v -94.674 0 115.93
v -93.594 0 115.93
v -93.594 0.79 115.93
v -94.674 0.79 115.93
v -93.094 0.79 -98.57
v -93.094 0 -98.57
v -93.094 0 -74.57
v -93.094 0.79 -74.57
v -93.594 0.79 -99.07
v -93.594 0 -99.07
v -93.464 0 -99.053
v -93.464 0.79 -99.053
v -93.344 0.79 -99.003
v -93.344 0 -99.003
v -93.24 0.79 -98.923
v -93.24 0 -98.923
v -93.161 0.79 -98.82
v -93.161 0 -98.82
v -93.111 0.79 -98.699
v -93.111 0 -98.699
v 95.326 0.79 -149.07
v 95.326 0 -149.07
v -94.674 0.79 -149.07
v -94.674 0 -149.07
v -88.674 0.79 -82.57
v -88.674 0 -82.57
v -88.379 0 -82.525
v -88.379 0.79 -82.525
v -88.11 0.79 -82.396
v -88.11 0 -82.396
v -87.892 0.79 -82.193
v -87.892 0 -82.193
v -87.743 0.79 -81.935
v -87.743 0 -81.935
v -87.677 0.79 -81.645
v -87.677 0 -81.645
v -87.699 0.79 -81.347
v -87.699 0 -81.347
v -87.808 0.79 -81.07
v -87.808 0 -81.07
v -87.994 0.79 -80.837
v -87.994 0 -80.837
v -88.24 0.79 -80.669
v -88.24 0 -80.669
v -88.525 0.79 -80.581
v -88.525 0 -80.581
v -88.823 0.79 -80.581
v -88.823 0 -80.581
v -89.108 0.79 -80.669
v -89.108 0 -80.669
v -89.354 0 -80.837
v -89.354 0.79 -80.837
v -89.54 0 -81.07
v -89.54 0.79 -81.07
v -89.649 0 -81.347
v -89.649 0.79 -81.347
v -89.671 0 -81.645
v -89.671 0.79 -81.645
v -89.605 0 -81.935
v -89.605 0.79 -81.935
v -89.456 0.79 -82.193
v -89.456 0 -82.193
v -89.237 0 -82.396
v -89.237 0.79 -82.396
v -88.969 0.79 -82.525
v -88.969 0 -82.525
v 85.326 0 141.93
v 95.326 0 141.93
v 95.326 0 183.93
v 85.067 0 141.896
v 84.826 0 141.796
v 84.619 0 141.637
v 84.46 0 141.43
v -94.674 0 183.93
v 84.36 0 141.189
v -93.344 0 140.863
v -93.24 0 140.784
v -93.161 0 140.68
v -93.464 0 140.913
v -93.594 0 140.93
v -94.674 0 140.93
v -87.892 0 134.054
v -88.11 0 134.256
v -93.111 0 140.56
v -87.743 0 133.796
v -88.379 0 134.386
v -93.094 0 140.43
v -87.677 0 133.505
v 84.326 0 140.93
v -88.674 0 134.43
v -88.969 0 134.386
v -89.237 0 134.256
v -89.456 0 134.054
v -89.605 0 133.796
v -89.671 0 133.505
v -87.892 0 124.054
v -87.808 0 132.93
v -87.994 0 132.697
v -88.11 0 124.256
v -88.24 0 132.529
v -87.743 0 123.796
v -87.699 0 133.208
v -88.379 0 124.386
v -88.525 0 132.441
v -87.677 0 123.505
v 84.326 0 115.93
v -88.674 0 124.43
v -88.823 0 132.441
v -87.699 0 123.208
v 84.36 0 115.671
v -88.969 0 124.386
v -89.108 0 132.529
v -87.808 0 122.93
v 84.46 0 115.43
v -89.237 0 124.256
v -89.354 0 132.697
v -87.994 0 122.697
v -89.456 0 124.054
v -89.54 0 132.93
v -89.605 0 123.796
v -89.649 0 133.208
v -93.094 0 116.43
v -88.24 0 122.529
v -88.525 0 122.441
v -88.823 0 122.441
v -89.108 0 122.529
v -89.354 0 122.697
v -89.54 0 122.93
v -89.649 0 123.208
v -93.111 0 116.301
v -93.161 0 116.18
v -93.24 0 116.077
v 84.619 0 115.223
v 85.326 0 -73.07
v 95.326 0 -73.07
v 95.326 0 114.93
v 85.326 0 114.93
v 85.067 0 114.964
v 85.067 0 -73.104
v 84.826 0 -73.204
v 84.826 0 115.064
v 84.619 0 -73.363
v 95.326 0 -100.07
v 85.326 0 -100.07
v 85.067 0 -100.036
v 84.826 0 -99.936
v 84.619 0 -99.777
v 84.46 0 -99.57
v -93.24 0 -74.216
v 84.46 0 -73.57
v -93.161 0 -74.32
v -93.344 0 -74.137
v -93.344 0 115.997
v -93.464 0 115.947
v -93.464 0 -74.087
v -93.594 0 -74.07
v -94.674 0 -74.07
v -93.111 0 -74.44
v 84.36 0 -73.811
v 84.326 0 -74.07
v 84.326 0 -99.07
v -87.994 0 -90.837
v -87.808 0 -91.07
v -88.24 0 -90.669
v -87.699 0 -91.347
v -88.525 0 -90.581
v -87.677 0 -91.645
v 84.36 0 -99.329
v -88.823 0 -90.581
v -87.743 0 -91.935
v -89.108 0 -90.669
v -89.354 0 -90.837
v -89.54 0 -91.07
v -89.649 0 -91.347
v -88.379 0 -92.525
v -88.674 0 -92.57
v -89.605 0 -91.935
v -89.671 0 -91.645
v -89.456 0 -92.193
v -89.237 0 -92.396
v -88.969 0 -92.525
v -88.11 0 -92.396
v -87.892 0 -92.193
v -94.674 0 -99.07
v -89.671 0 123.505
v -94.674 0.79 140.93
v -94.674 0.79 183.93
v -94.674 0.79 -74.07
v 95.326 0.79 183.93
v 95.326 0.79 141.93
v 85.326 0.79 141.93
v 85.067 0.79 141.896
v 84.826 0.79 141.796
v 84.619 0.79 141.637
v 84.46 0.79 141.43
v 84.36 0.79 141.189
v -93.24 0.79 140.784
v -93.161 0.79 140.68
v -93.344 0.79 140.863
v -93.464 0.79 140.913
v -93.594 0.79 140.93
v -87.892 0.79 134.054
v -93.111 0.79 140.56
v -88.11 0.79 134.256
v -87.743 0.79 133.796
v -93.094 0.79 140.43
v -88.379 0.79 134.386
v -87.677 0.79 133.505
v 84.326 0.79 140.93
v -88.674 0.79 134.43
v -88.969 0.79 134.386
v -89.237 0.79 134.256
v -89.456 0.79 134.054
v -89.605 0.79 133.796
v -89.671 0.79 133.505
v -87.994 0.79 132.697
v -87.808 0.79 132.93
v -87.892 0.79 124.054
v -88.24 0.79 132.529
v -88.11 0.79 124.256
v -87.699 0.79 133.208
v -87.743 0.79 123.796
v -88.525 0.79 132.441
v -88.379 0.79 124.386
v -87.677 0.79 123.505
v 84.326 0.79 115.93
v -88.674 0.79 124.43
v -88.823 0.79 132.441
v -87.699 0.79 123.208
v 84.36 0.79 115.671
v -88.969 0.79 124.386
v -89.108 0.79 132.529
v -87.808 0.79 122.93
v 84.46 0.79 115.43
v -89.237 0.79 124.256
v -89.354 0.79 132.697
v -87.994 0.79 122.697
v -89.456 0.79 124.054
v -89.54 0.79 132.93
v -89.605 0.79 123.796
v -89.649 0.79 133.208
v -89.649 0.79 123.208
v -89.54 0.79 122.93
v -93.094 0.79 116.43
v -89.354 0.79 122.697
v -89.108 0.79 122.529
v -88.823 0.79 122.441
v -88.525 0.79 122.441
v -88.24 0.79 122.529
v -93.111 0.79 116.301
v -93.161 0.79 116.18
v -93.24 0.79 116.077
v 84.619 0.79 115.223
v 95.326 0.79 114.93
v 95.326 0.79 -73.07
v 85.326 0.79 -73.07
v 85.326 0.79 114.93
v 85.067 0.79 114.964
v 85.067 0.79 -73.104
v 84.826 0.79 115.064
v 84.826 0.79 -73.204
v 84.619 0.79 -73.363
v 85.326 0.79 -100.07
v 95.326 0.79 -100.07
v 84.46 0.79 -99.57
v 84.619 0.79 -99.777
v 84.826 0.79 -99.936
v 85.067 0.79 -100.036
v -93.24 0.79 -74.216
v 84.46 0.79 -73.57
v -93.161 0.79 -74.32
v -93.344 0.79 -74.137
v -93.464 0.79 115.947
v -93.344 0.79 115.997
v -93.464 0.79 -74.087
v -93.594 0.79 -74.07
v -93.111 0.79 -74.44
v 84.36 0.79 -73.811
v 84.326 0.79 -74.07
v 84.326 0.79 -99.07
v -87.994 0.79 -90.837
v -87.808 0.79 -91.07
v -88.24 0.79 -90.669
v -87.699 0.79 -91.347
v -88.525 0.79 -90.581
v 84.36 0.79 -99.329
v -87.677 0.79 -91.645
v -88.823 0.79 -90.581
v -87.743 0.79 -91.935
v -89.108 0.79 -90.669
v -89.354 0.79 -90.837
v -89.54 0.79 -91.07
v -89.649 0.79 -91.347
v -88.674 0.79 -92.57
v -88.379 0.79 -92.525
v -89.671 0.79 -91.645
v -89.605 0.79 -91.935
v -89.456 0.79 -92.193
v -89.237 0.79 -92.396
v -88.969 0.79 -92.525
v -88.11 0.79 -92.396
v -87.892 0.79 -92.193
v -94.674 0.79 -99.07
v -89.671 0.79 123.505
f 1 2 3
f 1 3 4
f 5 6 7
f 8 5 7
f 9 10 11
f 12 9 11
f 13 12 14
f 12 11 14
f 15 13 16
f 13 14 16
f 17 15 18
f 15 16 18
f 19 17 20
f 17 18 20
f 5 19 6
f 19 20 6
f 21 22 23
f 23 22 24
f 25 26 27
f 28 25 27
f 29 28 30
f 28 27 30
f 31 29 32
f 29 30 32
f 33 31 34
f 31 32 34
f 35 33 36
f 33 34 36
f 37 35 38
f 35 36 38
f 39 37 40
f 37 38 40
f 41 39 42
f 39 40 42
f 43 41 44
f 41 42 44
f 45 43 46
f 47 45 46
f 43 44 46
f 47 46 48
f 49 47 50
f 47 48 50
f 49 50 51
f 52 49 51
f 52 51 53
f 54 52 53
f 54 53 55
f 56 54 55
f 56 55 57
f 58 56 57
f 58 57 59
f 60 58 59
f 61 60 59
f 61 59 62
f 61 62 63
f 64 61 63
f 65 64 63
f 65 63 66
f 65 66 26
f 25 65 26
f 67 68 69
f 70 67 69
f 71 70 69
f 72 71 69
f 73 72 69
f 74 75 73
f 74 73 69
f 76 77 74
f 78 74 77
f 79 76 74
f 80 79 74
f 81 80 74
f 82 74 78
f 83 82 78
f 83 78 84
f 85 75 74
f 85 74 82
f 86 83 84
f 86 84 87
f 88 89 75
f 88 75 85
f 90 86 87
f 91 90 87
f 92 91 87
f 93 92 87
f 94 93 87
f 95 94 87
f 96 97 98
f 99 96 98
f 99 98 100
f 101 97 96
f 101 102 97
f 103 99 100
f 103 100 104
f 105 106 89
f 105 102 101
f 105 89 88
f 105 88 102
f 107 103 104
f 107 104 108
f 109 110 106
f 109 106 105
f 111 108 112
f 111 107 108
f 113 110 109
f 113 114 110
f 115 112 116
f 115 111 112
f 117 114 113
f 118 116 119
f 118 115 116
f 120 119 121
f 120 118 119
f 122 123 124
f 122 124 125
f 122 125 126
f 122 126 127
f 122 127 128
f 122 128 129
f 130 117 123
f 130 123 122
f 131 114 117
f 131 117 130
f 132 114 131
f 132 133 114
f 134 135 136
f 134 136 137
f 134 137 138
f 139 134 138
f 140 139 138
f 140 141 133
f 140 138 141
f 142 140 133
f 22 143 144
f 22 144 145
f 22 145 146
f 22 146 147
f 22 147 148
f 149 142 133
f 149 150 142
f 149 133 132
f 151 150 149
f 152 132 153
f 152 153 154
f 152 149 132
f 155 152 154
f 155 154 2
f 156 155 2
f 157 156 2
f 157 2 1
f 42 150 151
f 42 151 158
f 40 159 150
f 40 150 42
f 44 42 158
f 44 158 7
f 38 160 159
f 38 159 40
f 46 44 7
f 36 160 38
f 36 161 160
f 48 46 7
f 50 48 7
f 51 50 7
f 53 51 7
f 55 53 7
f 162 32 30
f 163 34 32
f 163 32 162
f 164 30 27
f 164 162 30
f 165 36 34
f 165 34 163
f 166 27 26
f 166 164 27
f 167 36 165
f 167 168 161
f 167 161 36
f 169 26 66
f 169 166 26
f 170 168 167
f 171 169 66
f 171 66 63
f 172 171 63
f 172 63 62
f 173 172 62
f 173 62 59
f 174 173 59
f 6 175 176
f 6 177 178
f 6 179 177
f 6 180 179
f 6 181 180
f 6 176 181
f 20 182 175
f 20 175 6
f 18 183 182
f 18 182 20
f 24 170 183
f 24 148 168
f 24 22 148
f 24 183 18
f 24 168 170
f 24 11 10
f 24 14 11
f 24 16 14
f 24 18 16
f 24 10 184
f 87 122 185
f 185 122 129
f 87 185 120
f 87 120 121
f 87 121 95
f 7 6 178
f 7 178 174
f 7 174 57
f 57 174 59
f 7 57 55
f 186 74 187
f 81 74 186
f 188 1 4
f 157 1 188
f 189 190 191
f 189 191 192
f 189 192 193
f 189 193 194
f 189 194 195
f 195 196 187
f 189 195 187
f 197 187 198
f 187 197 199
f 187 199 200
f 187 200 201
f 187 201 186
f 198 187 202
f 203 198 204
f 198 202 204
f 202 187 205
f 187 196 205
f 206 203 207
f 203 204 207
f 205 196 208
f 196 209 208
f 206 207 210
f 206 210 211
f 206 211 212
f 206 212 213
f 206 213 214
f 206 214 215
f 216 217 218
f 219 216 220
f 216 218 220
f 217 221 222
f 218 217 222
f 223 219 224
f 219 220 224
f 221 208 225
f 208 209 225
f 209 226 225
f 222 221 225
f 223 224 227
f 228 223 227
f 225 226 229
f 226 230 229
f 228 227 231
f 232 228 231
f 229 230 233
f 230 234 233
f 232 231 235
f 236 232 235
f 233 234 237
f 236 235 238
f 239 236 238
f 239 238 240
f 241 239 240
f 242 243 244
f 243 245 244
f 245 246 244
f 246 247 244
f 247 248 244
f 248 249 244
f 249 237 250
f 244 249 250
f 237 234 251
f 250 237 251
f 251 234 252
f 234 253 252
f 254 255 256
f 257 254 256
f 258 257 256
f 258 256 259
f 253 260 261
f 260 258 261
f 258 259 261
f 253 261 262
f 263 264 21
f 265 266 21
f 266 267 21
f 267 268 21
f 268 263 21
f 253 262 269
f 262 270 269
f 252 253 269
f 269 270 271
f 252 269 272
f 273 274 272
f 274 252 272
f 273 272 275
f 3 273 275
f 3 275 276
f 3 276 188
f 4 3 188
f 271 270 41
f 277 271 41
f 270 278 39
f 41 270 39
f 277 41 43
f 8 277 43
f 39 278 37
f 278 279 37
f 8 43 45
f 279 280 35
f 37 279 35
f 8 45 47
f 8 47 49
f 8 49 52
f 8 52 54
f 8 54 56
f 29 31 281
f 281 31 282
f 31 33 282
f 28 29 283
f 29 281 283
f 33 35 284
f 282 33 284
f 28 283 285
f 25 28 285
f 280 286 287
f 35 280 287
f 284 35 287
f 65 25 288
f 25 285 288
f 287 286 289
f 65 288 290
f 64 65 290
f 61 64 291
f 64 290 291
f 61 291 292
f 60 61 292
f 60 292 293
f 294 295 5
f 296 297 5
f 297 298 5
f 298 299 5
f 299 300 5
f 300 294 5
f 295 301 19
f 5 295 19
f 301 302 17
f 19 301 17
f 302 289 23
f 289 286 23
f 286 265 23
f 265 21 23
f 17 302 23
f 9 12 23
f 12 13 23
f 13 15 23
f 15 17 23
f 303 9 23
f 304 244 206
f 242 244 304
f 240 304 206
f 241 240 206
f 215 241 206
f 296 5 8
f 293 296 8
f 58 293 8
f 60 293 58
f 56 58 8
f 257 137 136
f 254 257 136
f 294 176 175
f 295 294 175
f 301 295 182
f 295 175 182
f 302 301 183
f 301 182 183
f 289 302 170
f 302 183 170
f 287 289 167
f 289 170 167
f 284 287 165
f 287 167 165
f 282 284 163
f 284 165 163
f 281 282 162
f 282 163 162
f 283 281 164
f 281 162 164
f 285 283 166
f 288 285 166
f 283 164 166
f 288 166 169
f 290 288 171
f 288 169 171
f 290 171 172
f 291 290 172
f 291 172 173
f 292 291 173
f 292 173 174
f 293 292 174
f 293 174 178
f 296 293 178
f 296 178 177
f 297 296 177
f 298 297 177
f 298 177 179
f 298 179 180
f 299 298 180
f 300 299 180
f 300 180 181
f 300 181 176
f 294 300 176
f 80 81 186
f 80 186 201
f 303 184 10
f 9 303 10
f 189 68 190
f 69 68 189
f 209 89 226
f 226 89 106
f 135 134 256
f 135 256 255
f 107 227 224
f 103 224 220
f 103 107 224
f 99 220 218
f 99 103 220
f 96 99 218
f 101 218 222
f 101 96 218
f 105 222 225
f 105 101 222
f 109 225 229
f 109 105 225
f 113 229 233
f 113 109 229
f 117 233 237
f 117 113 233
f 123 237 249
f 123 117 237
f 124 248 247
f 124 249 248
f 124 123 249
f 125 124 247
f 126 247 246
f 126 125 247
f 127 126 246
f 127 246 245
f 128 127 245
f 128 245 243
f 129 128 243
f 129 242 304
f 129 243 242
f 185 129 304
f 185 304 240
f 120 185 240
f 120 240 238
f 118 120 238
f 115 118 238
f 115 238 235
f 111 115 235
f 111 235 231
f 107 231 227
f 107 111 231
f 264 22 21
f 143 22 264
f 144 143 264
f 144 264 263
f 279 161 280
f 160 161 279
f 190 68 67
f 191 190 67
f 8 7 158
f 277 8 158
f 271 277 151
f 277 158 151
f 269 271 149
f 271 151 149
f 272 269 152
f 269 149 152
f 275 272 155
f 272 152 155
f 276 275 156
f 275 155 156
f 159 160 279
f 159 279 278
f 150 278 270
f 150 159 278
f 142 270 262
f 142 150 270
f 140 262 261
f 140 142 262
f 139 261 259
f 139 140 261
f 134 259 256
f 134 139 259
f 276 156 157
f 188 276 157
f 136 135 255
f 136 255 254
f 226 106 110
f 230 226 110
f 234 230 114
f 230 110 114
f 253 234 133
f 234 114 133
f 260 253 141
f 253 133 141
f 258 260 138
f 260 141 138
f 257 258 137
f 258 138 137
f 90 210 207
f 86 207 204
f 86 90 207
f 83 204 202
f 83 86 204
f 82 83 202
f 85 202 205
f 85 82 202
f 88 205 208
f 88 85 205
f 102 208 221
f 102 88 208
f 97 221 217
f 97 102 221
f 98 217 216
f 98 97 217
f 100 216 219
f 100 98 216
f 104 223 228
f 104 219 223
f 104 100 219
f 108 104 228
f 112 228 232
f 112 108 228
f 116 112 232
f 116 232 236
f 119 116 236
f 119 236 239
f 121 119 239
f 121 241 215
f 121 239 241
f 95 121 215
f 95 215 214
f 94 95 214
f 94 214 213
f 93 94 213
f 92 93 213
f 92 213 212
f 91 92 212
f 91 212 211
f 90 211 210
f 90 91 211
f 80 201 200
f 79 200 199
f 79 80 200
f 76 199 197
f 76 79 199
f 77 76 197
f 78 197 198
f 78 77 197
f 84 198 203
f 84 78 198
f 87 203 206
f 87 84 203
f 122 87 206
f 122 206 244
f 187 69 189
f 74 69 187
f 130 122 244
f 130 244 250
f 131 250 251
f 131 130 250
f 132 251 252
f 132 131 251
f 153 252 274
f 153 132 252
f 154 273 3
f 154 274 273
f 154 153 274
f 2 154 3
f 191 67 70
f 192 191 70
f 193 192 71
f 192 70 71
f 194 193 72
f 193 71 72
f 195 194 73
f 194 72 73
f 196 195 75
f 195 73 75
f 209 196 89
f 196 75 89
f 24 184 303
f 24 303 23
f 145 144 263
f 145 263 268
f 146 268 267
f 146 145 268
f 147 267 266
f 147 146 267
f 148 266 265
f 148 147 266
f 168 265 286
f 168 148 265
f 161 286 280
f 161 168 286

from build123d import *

# Parameters (mm, degrees)
PANEL_DEPTH        = 0.79
SKETCH5_R          = 1
HINGE_MOUNT_DEPTH  = 10
HINGE_CUTOUT_DEPTH = 10


with BuildPart() as part:
    # Sketch1 → Panel (new body)
    with BuildSketch(Plane(origin=(0, 0, 0), x_dir=(1, 0, 0), z_dir=(0, 1, 0))):
        Polygon((65.326251897, 149.069802731), (95.326251897, 149.069802731), (95.326251897, -183.930197269), (-94.673748103, -183.930197269), (-94.673748103, 149.069802731), (-64.673748103, 149.069802731), (-39.673748103, 149.069802731), (40.326251897, 149.069802731), align=None)
    extrude(amount=PANEL_DEPTH)

    # Sketch5 → Hinge Mount (cut)
    with BuildSketch(Plane.XZ):
        with Locations(Location((-88.673748103, -91.569802731, 0), (0, 0, 270))):
            Circle(SKETCH5_R)
        with Locations(Location((-88.673748103, -81.569802731, 0), (0, 0, 270))):
            Circle(SKETCH5_R)
        with BuildLine():
            Line((-94.673748103, -99.069802731), (-93.593748103, -99.069802731))
            ThreePointArc((-93.593748103, -99.069802731), (-93.240194713, -98.923356122), (-93.093748103, -98.569802731))
            Line((-93.093748103, -98.569802731), (-93.093748103, -74.569802731))
            ThreePointArc((-93.093748103, -74.569802731), (-93.240194713, -74.216249341), (-93.593748103, -74.069802731))
            Line((-93.593748103, -74.069802731), (-94.673748103, -74.069802731))
            Line((-94.673748103, -74.069802731), (-94.673748103, -99.069802731))
        make_face()
    hinge_mount = extrude(amount=-HINGE_MOUNT_DEPTH, mode=Mode.SUBTRACT)

    # Sketch6 → Hinge Cutout (cut)
    with BuildSketch(Plane.XZ):
        with BuildLine():
            Line((95.326251897, -100.069802731), (85.326251897, -100.069802731))
            ThreePointArc((85.326251897, -100.069802731), (84.619145116, -99.776909513), (84.326251897, -99.069802731))
            Line((84.326251897, -99.069802731), (84.326251897, -74.069802731))
            ThreePointArc((84.326251897, -74.069802731), (84.619145116, -73.36269595), (85.326251897, -73.069802731))
            Line((85.326251897, -73.069802731), (95.326251897, -73.069802731))
            Line((95.326251897, -73.069802731), (95.326251897, -100.069802731))
        make_face()
    hinge_cutout = extrude(amount=-HINGE_CUTOUT_DEPTH, mode=Mode.SUBTRACT)

    # Mirror1: Hinge Mount, Hinge Cutout across plane
    add(hinge_mount.mirror(Plane(origin=(0, 0, 20.930197269), x_dir=(1, 0, 0), z_dir=(0, 0, -1))), mode=Mode.SUBTRACT)
    add(hinge_cutout.mirror(Plane(origin=(0, 0, 20.930197269), x_dir=(1, 0, 0), z_dir=(0, 0, -1))), mode=Mode.SUBTRACT)


solid = part.part
